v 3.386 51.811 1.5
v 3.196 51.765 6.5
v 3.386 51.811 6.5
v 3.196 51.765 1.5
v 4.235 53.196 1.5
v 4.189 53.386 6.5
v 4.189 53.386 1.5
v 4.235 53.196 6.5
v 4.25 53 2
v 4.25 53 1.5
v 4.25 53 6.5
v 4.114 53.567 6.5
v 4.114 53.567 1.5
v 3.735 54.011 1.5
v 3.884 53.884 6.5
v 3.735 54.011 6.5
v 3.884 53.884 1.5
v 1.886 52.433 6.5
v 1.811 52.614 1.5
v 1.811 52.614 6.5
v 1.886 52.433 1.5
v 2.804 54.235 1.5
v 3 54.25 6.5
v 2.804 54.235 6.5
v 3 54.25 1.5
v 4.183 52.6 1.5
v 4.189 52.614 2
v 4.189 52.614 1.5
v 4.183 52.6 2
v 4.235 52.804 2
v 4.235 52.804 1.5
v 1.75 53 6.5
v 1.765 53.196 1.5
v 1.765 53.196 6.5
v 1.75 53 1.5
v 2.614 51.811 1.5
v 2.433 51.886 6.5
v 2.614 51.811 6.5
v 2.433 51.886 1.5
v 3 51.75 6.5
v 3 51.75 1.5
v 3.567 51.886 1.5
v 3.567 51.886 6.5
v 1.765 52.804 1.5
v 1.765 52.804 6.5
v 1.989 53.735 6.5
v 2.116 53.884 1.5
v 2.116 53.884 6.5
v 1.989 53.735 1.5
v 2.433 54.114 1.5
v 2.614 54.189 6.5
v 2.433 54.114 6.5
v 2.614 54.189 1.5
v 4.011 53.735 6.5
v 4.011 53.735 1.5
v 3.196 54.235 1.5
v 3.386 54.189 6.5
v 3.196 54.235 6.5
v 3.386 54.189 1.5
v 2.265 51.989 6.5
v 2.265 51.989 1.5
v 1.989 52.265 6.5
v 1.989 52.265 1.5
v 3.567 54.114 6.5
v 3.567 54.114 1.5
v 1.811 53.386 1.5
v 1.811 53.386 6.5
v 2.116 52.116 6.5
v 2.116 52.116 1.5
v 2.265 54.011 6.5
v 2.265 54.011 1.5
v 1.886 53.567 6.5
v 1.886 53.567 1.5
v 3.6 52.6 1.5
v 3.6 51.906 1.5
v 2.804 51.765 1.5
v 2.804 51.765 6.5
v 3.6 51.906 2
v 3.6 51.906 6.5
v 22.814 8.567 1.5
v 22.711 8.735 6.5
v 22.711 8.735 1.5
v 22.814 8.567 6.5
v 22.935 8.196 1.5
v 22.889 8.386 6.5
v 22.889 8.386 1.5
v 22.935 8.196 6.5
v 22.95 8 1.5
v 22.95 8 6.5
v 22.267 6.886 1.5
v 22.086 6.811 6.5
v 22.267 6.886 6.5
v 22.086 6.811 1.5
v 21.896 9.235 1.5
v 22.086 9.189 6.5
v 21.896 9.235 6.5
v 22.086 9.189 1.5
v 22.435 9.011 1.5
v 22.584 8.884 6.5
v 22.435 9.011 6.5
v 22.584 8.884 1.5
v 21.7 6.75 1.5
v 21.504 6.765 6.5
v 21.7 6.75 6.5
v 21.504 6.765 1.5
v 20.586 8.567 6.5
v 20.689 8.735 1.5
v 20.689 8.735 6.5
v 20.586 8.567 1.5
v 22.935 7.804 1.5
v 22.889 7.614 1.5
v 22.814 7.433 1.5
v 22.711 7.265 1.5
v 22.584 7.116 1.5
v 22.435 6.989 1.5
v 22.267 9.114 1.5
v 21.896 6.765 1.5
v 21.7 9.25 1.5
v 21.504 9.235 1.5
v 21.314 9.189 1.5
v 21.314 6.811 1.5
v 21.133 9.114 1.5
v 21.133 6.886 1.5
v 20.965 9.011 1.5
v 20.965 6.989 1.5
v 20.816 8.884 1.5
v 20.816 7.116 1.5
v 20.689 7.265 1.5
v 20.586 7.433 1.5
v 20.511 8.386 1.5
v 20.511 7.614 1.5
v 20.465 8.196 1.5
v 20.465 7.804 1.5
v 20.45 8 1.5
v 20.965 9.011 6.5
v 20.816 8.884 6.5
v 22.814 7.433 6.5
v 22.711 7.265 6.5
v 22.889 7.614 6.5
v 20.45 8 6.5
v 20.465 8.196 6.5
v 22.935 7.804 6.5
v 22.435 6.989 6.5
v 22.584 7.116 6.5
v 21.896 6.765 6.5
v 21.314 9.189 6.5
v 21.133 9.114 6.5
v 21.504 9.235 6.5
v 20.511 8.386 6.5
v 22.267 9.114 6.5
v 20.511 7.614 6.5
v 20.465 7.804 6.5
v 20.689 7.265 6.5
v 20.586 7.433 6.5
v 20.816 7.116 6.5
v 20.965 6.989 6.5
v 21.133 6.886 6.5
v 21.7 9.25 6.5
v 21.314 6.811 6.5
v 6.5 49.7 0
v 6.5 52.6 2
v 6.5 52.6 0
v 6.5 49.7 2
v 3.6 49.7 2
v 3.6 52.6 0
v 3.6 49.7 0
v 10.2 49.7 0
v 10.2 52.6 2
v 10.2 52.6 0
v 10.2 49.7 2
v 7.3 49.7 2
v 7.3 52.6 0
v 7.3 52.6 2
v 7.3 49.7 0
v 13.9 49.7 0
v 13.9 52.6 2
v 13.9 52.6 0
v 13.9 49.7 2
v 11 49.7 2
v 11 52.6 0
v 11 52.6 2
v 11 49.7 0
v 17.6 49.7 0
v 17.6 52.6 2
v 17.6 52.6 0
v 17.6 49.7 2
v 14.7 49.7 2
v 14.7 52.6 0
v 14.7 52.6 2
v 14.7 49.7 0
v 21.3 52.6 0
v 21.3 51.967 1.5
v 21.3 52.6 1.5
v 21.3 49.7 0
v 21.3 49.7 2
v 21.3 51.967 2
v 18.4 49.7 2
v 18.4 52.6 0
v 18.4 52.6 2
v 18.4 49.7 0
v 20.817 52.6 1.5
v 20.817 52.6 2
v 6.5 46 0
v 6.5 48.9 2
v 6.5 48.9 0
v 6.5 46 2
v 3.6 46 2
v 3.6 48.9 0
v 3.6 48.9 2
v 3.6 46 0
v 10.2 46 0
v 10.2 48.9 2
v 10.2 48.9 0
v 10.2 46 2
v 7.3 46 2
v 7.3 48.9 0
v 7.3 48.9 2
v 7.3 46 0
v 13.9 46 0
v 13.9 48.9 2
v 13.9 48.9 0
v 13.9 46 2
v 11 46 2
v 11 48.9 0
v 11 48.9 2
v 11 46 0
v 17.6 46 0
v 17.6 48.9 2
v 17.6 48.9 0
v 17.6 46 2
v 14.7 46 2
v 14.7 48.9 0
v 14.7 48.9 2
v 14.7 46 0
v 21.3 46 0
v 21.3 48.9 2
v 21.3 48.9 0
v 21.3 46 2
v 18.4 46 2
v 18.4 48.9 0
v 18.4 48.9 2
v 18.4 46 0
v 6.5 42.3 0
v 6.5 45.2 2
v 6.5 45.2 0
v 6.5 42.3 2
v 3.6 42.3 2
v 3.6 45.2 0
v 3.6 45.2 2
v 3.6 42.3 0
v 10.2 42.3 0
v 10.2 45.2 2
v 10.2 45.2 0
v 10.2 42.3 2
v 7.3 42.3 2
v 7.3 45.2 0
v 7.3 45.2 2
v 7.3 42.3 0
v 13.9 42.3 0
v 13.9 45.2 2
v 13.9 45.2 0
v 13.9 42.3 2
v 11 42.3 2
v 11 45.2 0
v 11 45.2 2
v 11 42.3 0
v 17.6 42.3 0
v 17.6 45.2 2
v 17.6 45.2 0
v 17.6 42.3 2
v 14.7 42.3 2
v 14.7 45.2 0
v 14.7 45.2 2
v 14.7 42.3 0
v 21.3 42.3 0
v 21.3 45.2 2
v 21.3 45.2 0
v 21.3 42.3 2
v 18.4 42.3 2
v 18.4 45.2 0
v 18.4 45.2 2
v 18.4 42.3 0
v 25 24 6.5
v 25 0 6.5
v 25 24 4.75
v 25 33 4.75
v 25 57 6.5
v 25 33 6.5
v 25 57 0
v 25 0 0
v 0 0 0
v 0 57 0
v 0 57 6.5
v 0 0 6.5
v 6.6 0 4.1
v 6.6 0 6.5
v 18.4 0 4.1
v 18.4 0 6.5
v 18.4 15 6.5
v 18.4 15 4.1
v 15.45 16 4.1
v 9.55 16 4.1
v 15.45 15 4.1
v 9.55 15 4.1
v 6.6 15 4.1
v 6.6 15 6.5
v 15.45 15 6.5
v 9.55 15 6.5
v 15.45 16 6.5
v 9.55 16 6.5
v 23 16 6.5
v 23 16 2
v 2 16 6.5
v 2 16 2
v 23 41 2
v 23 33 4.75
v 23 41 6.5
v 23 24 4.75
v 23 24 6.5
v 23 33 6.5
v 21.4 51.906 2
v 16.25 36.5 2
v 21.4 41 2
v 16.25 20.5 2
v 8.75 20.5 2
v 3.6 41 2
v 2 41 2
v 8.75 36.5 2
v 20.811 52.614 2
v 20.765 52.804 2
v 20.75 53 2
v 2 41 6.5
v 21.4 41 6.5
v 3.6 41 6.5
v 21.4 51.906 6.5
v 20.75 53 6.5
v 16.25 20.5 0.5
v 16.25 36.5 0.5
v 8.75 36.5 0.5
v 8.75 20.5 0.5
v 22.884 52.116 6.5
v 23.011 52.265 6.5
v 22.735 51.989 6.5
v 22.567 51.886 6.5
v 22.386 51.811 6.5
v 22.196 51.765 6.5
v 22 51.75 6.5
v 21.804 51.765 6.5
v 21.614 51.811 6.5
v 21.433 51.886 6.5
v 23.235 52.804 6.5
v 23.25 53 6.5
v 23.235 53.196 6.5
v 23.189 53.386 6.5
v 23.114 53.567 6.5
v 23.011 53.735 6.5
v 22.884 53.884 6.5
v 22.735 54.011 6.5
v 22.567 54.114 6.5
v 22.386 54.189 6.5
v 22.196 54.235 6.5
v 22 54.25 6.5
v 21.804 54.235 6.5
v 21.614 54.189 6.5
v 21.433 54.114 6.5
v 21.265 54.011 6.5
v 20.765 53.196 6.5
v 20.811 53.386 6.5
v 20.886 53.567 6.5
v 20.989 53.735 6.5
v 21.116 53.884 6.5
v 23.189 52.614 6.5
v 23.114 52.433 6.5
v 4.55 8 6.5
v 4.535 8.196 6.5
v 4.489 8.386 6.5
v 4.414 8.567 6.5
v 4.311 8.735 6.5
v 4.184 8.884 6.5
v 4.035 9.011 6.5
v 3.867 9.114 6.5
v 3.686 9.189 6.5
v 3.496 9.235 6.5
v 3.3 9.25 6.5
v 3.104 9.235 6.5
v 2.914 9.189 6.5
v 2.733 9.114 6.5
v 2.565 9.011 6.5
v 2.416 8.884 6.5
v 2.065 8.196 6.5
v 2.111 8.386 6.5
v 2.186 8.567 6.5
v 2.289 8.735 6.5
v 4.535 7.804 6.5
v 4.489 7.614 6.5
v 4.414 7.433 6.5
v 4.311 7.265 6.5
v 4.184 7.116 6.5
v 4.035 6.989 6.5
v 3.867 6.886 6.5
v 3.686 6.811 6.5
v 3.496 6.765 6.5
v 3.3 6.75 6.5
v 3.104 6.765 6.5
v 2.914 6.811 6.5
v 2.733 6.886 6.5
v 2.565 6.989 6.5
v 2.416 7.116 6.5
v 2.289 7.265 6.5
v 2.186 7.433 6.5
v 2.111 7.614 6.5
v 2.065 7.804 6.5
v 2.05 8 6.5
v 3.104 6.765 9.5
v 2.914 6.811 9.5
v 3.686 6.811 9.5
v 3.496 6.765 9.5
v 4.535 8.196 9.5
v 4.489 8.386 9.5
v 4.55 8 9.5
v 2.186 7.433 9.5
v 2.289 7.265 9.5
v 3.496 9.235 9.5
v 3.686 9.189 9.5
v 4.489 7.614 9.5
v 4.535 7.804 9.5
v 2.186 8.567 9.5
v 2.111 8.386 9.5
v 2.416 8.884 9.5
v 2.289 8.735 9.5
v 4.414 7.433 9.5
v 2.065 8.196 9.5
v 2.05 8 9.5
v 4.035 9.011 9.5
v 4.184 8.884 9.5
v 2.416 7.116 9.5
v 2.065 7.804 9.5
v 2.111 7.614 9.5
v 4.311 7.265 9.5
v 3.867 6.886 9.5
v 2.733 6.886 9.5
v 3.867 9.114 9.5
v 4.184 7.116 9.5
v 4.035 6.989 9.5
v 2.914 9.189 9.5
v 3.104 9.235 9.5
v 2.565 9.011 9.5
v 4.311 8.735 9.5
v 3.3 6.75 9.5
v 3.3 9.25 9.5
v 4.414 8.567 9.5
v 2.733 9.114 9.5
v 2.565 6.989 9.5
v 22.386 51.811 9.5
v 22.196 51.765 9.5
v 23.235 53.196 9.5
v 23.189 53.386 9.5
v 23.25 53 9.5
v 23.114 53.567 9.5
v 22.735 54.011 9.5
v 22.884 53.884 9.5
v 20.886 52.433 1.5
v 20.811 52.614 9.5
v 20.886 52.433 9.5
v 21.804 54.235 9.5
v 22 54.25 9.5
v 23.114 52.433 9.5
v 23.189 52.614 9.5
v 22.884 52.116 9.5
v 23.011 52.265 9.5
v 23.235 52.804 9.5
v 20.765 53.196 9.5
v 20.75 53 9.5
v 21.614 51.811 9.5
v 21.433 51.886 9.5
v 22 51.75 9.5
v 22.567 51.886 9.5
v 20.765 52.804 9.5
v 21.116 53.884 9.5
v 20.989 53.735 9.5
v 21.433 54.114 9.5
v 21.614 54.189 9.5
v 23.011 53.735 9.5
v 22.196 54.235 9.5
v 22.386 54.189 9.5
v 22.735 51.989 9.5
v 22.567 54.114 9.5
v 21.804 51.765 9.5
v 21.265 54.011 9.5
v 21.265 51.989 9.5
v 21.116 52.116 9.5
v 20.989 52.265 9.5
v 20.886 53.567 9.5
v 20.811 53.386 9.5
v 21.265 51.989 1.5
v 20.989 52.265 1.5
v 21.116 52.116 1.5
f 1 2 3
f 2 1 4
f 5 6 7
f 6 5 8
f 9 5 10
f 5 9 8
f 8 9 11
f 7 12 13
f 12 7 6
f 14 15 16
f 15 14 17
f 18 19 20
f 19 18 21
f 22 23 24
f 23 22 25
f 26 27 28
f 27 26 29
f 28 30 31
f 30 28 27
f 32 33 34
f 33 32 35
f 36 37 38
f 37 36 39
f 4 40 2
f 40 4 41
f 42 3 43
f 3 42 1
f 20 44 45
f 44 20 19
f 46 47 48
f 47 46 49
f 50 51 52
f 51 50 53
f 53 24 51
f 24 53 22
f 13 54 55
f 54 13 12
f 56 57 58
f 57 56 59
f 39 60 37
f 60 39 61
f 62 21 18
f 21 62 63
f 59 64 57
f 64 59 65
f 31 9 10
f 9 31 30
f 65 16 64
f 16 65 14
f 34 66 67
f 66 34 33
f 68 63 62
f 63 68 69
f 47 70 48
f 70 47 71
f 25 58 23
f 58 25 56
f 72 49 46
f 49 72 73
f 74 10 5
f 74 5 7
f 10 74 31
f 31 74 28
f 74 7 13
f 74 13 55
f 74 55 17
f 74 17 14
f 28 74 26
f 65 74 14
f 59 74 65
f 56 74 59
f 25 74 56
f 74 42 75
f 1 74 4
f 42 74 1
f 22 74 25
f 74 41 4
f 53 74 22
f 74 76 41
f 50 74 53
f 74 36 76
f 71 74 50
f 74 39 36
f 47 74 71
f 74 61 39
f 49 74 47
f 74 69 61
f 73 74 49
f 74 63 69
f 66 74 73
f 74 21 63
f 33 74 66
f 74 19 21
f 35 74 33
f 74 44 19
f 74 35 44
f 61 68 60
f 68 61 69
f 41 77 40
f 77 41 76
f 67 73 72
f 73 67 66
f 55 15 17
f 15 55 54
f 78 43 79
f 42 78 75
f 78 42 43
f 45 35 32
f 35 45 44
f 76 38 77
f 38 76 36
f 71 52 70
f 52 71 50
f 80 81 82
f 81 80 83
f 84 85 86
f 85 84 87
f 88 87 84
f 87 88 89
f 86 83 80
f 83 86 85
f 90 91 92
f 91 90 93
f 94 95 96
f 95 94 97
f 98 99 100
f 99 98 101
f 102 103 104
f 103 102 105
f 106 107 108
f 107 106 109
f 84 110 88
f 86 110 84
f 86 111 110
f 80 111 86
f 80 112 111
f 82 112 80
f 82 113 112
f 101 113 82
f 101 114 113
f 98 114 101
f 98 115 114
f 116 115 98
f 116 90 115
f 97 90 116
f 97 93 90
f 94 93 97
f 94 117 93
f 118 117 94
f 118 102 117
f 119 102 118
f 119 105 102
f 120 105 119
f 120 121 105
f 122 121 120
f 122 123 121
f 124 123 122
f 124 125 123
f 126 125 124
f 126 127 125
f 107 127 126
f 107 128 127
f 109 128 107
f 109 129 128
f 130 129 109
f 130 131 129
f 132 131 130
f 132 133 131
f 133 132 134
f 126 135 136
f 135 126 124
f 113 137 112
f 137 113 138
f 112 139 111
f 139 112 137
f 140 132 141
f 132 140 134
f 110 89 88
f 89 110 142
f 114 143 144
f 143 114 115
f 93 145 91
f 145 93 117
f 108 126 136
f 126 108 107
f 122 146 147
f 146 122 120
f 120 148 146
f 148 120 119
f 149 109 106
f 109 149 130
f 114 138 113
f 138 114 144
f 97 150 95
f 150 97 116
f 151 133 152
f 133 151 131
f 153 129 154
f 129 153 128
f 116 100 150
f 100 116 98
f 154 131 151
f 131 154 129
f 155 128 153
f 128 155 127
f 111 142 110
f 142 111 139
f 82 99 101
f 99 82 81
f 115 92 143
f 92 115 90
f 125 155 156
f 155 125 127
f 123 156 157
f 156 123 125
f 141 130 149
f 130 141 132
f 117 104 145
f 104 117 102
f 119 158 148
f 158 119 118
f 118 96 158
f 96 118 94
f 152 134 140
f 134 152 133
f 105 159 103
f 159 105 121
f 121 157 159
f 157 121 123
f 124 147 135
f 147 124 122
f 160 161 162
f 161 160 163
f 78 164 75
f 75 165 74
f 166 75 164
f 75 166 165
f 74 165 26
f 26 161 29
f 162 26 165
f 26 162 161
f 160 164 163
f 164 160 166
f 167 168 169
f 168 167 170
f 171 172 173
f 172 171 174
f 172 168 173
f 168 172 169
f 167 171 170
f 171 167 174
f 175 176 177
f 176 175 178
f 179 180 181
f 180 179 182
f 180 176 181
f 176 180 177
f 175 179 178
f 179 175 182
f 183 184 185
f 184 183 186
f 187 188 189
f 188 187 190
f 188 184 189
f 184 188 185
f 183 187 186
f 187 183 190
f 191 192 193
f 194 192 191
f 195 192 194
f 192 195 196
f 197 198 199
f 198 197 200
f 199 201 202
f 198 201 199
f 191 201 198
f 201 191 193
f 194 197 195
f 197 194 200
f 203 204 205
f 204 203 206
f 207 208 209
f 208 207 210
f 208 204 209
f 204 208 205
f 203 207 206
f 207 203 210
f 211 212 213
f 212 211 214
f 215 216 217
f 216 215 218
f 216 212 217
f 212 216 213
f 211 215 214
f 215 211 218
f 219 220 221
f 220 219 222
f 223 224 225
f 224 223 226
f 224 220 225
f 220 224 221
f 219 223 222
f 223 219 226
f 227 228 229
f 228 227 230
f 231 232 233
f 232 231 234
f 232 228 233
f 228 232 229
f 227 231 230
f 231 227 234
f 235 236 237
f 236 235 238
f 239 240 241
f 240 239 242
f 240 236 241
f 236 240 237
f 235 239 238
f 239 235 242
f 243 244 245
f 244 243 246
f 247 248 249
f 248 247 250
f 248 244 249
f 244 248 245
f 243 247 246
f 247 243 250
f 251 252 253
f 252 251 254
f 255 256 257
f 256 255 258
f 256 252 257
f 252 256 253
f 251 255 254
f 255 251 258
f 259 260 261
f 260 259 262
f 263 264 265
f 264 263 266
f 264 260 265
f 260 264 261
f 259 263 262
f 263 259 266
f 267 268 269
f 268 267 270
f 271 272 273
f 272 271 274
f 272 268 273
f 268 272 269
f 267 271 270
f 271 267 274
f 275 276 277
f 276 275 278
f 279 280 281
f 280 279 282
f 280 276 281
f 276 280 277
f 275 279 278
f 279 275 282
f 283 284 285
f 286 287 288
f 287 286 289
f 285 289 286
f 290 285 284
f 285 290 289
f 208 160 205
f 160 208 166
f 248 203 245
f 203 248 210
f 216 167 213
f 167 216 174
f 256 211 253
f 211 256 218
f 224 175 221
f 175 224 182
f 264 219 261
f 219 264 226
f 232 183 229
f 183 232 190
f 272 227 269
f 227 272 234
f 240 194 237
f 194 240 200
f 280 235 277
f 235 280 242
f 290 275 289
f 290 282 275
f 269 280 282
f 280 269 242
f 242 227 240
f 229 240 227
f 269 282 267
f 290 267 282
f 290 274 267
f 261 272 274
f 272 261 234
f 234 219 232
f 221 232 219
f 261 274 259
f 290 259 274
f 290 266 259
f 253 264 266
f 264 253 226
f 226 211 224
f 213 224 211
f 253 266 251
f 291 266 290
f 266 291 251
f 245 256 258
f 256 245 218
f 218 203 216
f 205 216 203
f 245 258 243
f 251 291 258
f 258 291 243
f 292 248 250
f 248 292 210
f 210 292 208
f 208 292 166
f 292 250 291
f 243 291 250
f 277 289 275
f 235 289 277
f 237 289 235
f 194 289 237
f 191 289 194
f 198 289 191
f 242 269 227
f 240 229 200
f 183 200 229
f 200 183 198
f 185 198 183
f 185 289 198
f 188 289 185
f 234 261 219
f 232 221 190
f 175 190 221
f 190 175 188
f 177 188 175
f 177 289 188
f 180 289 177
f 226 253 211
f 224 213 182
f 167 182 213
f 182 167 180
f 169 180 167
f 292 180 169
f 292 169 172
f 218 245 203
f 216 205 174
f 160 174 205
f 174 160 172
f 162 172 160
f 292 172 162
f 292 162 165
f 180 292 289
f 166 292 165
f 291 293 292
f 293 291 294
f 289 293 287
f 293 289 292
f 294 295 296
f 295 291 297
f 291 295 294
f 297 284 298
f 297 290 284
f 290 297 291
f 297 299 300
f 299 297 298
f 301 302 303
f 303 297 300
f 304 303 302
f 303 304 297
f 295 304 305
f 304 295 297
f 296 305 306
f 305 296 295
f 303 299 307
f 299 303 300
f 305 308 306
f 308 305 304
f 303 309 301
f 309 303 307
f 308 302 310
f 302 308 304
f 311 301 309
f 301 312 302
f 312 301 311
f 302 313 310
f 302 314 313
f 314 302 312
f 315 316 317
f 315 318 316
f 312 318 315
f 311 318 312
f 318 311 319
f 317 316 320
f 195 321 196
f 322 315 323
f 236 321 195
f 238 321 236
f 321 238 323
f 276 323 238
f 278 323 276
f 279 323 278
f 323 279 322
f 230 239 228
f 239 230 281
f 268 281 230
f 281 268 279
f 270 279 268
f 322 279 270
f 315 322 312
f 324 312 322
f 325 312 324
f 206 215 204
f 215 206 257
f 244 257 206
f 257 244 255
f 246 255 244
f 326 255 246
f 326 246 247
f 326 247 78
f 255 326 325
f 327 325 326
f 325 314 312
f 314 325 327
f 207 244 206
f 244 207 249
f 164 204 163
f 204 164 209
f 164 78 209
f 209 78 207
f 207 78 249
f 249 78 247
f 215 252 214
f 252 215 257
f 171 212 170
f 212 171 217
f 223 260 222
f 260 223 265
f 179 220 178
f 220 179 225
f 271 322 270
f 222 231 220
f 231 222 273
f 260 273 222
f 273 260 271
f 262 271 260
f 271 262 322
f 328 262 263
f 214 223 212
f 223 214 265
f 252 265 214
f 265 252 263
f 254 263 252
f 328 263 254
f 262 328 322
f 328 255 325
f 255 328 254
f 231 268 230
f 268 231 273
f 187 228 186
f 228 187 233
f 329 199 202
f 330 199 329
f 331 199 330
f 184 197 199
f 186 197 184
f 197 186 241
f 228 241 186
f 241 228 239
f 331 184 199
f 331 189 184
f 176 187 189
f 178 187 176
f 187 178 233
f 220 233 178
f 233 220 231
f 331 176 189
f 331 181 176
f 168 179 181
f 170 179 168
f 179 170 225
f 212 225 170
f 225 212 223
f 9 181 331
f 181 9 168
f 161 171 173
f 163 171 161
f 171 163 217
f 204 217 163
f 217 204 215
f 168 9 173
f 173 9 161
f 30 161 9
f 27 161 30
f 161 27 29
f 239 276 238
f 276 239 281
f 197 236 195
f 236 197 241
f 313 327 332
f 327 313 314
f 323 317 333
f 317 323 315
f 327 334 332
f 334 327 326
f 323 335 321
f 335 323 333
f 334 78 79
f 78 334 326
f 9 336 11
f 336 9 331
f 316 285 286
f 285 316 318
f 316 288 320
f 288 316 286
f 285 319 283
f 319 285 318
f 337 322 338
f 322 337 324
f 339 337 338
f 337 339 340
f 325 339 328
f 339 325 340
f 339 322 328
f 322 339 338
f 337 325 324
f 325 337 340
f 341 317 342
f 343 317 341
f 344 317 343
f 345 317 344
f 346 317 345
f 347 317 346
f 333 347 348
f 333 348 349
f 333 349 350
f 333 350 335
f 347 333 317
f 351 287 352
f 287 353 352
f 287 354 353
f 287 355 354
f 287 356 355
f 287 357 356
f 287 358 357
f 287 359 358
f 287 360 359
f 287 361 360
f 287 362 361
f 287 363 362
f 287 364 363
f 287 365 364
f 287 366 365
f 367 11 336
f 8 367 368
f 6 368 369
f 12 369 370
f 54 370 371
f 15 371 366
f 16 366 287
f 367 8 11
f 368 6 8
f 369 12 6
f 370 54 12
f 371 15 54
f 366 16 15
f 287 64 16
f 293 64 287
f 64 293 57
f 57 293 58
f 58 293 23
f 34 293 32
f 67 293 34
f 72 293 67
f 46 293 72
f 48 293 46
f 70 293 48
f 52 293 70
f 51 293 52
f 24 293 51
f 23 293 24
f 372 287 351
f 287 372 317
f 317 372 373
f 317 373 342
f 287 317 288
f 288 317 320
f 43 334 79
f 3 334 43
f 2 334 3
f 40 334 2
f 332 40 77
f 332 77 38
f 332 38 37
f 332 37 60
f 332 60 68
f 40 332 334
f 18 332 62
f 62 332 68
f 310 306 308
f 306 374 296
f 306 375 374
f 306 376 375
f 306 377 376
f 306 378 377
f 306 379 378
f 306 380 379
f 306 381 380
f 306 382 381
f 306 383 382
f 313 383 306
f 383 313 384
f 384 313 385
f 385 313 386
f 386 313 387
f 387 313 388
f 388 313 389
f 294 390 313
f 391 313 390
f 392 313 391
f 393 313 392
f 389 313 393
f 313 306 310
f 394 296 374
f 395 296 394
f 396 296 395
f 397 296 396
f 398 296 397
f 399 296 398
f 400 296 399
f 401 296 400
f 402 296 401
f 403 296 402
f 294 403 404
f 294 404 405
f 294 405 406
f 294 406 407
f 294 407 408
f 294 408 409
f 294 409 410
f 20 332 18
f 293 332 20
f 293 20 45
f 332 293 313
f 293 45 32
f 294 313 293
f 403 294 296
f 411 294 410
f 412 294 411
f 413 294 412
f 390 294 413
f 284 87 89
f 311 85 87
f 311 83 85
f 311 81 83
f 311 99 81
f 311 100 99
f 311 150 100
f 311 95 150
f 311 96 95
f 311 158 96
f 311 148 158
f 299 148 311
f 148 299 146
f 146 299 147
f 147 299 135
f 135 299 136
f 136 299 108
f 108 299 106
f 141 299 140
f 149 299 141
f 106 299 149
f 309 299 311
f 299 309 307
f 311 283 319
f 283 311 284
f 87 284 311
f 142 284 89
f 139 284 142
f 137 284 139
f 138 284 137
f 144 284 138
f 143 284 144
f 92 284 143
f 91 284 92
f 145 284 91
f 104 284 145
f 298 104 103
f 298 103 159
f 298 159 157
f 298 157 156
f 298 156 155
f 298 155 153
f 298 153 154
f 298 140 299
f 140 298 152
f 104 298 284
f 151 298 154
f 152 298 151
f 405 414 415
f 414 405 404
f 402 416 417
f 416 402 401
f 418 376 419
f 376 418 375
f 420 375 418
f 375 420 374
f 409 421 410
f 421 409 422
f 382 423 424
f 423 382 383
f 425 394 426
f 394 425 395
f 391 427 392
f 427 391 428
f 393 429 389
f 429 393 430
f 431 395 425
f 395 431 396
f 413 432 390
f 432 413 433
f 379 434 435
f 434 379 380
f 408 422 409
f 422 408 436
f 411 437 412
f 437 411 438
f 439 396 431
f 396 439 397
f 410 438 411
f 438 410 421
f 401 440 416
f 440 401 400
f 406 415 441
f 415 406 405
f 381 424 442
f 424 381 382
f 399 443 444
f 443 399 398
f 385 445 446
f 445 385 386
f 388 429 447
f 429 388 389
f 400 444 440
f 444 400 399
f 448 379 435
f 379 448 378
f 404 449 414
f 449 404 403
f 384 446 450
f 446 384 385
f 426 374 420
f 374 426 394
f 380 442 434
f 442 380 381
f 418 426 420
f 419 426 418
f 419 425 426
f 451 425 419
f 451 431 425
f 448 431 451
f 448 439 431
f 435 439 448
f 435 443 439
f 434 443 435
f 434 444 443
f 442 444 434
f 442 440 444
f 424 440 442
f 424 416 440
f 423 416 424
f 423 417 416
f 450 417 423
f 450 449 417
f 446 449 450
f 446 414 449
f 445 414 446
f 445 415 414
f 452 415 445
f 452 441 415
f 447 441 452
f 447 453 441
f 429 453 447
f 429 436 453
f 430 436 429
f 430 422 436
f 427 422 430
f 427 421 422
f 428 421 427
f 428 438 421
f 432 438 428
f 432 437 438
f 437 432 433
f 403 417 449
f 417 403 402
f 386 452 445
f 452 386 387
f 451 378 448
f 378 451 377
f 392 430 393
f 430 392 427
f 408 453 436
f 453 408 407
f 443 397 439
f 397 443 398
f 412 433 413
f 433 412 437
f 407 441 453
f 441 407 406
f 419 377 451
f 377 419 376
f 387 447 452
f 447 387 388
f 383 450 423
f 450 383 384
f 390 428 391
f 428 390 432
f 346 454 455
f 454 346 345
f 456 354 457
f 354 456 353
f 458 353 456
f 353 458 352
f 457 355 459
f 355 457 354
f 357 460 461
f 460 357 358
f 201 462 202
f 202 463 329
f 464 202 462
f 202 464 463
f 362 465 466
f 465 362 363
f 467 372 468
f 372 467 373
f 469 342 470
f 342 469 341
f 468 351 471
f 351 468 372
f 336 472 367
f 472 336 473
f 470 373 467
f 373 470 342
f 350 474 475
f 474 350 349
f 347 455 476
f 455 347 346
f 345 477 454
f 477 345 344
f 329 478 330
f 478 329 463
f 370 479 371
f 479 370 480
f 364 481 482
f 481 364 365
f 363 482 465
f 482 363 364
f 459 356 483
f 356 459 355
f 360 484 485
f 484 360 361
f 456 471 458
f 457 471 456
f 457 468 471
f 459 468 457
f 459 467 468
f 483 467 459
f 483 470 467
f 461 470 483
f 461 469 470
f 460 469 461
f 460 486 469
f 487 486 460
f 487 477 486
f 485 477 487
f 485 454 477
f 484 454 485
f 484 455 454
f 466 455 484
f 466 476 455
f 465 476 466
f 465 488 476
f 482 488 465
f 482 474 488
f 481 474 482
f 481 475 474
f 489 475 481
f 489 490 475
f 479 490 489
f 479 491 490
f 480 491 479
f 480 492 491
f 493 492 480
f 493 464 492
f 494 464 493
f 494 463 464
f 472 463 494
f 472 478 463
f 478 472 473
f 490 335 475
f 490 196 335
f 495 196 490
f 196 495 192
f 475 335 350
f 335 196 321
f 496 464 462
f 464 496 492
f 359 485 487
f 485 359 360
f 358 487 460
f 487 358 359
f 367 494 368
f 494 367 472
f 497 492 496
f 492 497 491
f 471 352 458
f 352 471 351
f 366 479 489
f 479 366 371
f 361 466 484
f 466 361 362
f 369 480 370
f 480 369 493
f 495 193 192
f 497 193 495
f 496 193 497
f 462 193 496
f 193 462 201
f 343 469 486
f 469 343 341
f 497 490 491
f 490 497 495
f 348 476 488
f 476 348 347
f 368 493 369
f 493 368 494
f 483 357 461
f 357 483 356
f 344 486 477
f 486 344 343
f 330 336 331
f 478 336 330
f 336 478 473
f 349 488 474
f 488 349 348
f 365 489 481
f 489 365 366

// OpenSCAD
$fn=40;

USB_width = 11.8;
USB_height = 4.8;
USB_length = 16;

USBC_Height = 3.5;
USBC_Width = 9;
USBC_Side = 1;

BoardWidth = 21;
BoardHeight = 9;
Board_Length = 25;

Sensor_Width = 17.8;
Sensor_Height = 9;
//SHT45
Sensor_Length = 28;
//DS18B20
Sensor_Length = 14;
Sensor_Wall = 2;

LED_Length = 16;
LED_Width = 7.5;

wall = 2;
connector_Diameter = 2.5;
connector_Height = 6;

Full_Length = USB_length + Board_Length + Sensor_Length + Sensor_Wall;
Full_Heigh = BoardHeight + 2 * wall;
Full_Width = BoardWidth + 2 * wall;

Grid_Size = 2.9;
Grid_Gap = 0.8;
//SHT45
Grid_Rows = 7;
//DS18B20
Grid_Rows = 3;

upper = 1;

difference()
{
    cube([BoardWidth+2*wall, Full_Length, Full_Heigh]);
    // USB-A
    translate([(Full_Width-USB_width)/2, -1 , (Full_Heigh-USB_height)/2])
        cube([USB_width, USB_length, USB_height]);
    translate([(Full_Width-USB_width/2)/2, 0 , (Full_Heigh-USB_height)/2])
        cube([USB_width/2, USB_length, USB_height]);
    // Board
    translate([(Full_Width-BoardWidth)/2, USB_length , (Full_Heigh-BoardHeight)/2])
        cube([BoardWidth, Board_Length, BoardHeight]);
    // Sensor
    translate([(Full_Width-Sensor_Width)/2, USB_length+Board_Length-Sensor_Wall , (Full_Heigh-Sensor_Height)/2])
        cube([Sensor_Width, Sensor_Length, Sensor_Height]);
    // USB-C
    translate([(Full_Width-wall)*USBC_Side, USB_length+(Board_Length-USBC_Width)/2 , (Full_Heigh-USBC_Height)/2])
        cube([5, USBC_Width, USBC_Height]);
    // LED
    translate([(Full_Width-LED_Width)/2, USB_length+(Board_Length-LED_Length)/2 , 0.5])
        cube([LED_Width, LED_Length, Full_Heigh-1]);

    translate([-1,-1,Full_Heigh/2*upper])
        cube([BoardWidth+2*wall+2, Full_Length+2, Full_Heigh/2+.001]);

    if (upper == 1) {
        Pins1();
    }
    else {
        Pins2();
    }
    Grid();
}

if (upper == 1) {
    Pins2();
}
else {
    Pins1();
}

module Pins1()
{
    translate([3, Full_Length-4, (Full_Heigh-connector_Height)/2-2*upper])
        cylinder(d=connector_Diameter, h=connector_Height+2);
    translate([Full_Width-(Full_Width-USB_width)/4, USB_length/2, (Full_Heigh-connector_Height)/2-2*upper])
        cylinder(d=connector_Diameter, h=connector_Height+2);
}

module Pins2()
{
    height = (Full_Heigh-connector_Height)/2-2*upper;
    translate([(Full_Width-USB_width)/4, USB_length/2, height])
        cylinder(d=connector_Diameter, h=connector_Height+2);
    translate([Full_Width-3, Full_Length-4, height])
        cylinder(d=connector_Diameter, h=connector_Height+2);
}

module Grid()
{
    translate([(Full_Width-Sensor_Width)/2, Full_Length-Grid_Gap-Grid_Size-Sensor_Wall-Grid_Gap*2, -0.1])
    for (y=[0:Grid_Rows-1]) {
        for (x=[0:4]) {
            translate([x*(Grid_Size+Grid_Gap), -y*(Grid_Size+Grid_Gap), 0])
                cube([Grid_Size, Grid_Size, 40]);
        }
    }
        
}
